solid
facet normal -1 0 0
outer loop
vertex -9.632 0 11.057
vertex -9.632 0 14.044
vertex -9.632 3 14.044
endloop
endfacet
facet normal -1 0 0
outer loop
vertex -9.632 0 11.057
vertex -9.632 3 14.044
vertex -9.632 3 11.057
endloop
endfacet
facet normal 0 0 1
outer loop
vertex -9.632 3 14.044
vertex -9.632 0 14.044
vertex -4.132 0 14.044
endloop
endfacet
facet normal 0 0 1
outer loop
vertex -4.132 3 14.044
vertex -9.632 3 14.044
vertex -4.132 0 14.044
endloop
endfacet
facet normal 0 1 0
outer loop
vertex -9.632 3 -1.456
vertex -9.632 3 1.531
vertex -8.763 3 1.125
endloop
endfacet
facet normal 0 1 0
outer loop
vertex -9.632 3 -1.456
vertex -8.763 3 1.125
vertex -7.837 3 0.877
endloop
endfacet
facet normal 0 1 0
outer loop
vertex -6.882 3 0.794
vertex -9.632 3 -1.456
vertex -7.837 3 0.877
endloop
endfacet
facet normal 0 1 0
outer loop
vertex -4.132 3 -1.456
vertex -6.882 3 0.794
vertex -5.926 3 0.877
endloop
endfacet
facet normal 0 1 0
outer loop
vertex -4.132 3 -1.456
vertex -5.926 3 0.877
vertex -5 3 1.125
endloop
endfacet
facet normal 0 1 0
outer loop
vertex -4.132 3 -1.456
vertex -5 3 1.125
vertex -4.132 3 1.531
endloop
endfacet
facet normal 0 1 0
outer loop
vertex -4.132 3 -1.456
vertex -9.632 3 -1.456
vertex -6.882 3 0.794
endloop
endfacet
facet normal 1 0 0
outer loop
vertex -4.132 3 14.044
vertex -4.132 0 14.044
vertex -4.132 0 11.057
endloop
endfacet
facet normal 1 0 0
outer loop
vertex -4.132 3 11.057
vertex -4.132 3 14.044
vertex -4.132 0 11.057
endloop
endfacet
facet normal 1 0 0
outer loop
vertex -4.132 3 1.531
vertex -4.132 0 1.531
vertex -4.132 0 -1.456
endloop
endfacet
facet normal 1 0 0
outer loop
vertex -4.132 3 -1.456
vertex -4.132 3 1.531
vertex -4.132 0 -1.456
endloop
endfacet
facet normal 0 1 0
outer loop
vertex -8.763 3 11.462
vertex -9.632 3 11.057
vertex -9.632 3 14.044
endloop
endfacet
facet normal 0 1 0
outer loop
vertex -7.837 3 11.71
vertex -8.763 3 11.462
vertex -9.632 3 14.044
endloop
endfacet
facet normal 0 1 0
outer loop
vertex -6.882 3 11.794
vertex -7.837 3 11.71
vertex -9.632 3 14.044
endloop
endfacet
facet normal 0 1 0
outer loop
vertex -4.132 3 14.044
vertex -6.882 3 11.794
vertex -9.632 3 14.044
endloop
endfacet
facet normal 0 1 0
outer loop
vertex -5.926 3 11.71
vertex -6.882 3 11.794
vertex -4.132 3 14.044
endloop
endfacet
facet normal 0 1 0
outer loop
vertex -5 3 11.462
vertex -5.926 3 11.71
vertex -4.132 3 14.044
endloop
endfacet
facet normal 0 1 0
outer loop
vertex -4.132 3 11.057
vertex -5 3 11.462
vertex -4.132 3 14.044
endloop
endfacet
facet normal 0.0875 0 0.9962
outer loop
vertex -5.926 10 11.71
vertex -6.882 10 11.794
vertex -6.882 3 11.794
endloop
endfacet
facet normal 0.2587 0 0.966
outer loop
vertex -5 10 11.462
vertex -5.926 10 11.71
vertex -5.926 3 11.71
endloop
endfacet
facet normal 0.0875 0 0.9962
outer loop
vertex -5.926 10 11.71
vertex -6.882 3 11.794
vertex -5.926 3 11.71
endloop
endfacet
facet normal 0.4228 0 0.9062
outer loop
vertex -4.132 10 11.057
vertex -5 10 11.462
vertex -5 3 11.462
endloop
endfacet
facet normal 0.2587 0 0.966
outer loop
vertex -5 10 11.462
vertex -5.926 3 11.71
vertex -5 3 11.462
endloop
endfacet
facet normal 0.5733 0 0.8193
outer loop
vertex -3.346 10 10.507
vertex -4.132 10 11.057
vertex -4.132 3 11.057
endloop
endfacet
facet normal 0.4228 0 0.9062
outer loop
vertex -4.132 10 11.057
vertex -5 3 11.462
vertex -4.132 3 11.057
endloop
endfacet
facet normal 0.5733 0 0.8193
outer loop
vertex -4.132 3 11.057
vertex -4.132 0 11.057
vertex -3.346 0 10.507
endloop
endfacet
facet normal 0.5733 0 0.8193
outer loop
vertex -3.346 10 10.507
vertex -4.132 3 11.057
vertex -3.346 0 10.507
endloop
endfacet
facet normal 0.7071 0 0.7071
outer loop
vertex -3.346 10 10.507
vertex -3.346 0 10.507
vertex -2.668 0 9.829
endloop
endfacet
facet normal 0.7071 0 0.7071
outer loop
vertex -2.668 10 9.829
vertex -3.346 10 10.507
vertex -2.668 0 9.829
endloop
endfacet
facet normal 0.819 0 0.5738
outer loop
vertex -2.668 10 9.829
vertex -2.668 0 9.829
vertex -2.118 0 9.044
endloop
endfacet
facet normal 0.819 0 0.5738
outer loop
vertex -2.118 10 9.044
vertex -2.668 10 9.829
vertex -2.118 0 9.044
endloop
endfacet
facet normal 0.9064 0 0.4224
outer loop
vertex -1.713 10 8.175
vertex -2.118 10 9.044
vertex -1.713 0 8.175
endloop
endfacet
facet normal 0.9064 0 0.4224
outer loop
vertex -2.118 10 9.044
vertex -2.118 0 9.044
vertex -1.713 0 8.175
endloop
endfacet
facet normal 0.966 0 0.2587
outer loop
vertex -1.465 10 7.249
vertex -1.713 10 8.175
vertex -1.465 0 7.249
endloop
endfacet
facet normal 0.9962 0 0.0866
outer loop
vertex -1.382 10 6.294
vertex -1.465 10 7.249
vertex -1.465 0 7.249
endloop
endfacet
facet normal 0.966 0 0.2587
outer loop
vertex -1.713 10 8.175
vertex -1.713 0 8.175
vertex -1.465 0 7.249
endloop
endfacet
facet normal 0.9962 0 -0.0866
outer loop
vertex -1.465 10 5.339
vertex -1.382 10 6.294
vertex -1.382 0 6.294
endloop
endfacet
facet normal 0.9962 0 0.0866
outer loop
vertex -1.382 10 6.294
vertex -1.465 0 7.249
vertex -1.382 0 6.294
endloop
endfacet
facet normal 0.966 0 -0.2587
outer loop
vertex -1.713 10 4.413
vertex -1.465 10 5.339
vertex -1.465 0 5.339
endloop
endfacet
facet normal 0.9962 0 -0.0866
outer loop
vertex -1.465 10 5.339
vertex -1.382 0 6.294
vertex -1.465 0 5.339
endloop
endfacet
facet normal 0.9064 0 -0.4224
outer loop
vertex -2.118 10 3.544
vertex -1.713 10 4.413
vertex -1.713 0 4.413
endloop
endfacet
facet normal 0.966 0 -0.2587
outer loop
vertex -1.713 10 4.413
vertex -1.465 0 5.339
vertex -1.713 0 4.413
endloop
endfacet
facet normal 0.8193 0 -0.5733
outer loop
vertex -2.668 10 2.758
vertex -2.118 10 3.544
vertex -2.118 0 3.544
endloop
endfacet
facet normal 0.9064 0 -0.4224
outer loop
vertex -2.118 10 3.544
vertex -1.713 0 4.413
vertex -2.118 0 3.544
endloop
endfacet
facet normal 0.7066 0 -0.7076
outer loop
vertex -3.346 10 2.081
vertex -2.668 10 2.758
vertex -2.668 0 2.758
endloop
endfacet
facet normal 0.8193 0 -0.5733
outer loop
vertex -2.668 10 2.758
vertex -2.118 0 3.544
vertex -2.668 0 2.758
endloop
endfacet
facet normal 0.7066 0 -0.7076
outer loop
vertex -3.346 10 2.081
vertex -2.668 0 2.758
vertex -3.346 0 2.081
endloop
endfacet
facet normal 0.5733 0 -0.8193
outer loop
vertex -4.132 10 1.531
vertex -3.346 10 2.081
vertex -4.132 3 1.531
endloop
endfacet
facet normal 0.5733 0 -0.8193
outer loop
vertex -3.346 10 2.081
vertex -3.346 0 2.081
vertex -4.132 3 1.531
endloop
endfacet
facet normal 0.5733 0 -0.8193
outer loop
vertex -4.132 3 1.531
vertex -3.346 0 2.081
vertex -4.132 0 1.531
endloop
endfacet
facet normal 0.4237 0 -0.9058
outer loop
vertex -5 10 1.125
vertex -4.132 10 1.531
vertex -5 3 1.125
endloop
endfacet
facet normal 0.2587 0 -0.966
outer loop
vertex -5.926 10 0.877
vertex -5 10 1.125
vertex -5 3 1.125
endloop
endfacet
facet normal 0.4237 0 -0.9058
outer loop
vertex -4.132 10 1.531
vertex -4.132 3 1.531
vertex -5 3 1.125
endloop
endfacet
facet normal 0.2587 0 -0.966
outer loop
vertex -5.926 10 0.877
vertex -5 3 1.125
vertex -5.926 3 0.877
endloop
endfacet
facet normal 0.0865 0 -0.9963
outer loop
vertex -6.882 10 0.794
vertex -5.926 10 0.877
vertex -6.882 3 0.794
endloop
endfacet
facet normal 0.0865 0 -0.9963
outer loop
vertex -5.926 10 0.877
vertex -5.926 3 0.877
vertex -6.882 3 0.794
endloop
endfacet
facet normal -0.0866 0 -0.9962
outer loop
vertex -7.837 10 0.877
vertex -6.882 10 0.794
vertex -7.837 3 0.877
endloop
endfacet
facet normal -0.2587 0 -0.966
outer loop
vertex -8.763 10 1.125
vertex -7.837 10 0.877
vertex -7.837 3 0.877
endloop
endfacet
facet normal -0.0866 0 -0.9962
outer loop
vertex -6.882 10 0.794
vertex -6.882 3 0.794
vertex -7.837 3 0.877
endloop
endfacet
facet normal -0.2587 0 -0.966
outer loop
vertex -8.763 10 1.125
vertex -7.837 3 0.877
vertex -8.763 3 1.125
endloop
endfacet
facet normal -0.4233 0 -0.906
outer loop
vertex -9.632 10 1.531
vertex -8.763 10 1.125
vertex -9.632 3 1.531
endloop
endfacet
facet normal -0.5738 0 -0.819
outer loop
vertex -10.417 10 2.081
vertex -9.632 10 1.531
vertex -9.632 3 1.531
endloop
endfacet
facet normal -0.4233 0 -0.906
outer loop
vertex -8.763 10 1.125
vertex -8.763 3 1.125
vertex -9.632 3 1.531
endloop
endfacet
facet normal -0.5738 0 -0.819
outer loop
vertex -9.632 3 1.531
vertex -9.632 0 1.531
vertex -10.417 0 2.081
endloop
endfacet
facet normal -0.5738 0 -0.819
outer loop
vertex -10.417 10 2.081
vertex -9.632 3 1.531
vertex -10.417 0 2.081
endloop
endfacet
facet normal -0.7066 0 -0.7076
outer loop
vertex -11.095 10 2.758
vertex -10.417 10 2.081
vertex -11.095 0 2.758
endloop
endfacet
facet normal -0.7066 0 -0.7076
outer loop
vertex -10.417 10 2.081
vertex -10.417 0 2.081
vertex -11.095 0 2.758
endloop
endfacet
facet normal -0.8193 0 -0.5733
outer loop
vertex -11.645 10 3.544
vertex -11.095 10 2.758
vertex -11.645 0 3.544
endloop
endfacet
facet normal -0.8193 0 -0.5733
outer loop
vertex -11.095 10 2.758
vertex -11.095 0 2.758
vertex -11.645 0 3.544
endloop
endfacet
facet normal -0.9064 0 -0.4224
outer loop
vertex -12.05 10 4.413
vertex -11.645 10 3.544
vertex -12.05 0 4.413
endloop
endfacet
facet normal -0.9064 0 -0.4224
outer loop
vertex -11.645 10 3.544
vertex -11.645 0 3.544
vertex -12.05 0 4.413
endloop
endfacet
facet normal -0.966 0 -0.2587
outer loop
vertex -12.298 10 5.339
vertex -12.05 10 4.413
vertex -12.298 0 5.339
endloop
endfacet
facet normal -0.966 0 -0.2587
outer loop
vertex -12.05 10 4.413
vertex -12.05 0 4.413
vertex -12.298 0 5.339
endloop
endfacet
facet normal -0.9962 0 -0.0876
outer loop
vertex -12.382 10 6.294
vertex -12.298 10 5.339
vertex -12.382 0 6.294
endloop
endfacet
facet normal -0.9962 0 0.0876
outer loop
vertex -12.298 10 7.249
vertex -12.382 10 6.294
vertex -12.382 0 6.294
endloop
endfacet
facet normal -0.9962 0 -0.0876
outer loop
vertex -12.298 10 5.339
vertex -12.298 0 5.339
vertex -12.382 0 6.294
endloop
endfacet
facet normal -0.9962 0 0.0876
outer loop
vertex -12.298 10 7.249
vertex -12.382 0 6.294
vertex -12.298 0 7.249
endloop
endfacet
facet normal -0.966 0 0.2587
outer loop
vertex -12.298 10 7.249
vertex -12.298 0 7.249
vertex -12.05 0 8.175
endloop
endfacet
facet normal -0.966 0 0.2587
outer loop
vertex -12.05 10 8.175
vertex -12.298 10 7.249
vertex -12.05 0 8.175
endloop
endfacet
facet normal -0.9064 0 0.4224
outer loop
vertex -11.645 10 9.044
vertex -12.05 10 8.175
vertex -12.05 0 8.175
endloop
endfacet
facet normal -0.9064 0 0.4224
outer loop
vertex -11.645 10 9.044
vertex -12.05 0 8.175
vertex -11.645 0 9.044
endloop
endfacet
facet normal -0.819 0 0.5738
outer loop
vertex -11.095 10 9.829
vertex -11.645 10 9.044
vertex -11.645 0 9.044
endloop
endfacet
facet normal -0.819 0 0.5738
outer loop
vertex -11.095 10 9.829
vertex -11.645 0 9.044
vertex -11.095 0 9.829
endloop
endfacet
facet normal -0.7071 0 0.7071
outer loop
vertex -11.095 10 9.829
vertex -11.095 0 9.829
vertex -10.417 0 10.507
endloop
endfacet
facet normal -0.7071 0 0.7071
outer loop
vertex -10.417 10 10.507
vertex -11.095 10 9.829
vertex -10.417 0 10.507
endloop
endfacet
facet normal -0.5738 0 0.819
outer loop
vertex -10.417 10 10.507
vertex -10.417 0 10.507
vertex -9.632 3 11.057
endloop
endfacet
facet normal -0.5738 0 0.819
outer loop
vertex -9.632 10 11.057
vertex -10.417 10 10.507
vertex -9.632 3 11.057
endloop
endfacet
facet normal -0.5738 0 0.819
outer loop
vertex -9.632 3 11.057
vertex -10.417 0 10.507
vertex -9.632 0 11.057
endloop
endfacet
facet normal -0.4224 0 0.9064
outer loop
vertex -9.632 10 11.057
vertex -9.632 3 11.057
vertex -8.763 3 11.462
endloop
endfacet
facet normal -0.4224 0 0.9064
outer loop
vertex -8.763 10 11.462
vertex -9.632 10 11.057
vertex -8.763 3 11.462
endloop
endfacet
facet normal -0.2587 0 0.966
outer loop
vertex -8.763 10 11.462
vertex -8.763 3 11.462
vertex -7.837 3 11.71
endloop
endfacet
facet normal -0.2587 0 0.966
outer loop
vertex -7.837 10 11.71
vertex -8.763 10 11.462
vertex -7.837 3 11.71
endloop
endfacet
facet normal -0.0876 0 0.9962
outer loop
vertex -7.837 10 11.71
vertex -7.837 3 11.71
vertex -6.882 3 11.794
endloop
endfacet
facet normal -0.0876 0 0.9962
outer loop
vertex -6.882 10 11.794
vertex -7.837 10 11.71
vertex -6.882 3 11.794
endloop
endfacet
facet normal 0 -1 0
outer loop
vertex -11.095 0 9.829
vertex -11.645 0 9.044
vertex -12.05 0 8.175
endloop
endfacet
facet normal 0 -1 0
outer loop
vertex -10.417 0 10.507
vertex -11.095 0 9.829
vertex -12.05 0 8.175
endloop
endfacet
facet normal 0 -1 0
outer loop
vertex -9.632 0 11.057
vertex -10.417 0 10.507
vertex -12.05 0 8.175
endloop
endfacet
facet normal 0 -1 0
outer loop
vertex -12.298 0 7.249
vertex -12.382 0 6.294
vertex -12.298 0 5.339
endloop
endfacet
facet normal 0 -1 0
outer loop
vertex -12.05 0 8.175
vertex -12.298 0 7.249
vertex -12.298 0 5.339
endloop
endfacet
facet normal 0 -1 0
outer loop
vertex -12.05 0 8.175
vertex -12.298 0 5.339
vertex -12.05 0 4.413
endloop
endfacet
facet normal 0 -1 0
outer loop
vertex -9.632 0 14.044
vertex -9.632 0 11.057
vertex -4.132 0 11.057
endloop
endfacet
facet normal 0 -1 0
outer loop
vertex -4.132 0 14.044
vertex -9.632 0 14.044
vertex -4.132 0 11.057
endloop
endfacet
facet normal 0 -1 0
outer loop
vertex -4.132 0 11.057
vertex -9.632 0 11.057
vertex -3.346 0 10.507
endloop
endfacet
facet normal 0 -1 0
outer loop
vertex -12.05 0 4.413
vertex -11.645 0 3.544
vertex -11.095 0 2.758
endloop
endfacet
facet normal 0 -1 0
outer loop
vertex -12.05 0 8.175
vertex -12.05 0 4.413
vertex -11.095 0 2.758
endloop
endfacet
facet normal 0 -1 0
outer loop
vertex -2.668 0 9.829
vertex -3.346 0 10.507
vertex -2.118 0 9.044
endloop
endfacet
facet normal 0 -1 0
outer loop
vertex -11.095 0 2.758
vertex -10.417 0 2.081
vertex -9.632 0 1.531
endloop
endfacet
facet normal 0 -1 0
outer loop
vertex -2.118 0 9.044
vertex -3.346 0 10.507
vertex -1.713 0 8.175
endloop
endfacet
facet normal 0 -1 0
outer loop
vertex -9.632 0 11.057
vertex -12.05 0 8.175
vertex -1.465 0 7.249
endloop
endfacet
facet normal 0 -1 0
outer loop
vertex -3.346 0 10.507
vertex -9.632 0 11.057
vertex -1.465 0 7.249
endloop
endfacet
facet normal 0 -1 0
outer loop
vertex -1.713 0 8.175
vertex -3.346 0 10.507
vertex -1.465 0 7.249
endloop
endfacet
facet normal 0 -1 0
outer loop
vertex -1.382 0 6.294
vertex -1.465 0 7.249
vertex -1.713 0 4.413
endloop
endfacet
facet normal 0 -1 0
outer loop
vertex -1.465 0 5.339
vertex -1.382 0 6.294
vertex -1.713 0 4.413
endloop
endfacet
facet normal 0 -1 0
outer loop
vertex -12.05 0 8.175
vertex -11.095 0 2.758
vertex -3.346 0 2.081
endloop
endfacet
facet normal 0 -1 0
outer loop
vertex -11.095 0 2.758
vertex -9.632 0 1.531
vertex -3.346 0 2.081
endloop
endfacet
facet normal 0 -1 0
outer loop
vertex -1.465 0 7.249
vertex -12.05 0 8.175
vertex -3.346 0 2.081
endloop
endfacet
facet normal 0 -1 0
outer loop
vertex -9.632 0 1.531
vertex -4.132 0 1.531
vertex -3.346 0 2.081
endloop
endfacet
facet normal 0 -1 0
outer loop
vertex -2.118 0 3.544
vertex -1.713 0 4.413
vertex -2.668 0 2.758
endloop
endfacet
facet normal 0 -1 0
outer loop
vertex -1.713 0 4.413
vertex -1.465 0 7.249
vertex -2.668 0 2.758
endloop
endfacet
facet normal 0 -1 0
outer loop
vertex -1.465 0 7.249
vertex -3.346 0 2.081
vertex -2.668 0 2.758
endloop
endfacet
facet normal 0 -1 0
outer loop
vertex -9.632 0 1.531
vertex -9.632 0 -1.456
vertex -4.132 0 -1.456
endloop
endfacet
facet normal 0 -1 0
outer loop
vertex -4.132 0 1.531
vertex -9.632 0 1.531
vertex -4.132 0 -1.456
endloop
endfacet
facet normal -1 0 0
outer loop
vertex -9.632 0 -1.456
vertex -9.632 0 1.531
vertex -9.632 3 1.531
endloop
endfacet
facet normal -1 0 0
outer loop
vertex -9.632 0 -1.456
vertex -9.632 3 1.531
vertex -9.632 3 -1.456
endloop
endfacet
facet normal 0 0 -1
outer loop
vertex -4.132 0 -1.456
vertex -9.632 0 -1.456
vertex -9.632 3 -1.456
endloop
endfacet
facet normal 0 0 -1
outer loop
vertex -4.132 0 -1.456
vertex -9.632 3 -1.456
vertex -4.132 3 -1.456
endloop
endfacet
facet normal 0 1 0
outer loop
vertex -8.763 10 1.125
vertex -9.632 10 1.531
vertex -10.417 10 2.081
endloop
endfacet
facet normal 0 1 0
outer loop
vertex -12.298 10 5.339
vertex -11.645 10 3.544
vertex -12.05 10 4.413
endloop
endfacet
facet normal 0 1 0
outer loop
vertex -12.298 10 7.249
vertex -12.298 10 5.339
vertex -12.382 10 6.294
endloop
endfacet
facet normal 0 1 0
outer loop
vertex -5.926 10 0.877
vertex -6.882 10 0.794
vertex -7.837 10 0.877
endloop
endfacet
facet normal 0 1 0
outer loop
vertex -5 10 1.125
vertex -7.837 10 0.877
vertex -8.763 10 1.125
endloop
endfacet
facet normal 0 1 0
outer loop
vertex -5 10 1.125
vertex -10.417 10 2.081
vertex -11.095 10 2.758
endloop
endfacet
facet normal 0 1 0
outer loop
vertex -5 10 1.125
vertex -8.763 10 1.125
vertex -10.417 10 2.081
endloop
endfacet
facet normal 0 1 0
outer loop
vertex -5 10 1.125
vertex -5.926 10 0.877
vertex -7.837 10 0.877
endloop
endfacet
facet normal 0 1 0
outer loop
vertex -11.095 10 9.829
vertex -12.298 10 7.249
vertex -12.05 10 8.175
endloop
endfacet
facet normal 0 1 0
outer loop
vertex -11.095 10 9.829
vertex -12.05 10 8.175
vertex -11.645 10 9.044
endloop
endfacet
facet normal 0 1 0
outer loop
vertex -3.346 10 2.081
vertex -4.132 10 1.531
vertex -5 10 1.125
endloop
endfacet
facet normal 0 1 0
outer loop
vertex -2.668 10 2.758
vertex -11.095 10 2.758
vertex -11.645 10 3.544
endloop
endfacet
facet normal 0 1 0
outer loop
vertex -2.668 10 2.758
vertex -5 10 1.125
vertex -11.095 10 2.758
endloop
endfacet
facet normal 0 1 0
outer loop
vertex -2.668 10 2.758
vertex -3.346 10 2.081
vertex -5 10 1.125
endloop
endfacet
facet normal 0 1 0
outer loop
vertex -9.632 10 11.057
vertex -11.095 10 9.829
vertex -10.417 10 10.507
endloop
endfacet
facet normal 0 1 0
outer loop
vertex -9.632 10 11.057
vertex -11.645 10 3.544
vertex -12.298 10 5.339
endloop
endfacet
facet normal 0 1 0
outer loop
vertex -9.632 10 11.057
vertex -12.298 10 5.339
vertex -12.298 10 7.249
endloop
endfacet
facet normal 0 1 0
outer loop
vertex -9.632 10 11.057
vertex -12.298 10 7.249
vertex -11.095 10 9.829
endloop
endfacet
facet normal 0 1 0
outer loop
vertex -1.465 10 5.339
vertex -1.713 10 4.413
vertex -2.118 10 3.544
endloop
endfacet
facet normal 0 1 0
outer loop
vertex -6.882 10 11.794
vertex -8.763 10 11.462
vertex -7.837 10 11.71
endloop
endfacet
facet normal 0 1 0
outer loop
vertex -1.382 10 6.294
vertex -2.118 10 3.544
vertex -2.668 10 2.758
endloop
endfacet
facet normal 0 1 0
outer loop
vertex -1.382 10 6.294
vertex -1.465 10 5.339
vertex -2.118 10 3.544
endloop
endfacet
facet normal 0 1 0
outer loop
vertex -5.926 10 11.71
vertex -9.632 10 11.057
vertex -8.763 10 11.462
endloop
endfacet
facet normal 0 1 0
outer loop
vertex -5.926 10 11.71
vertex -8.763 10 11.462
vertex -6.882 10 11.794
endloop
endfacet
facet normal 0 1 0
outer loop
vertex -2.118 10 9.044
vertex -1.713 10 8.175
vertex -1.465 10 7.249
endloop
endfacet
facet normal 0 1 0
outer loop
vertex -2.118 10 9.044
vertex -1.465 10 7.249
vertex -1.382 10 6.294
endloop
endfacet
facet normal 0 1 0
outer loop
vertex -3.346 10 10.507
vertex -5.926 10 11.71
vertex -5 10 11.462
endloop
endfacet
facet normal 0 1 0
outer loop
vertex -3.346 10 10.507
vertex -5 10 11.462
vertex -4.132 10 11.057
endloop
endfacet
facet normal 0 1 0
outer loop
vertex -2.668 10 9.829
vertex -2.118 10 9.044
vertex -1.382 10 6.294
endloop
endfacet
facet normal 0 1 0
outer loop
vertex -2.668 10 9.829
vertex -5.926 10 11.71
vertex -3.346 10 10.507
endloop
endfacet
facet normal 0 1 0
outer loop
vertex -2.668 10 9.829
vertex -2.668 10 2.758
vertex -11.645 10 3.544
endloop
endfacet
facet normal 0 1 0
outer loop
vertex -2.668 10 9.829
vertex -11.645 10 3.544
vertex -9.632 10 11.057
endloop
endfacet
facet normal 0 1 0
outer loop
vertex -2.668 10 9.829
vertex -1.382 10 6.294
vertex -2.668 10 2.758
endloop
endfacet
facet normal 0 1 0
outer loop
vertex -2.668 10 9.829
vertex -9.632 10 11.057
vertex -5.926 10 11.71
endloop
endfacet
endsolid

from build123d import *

# Parameters (mm, degrees)
CROQUIS1_R              = 5.5
SALIENTE_EXTRUIR1_DEPTH = 10
CROQUIS3_W              = 5.5
CROQUIS3_H              = 15.5
SALIENTE_EXTRUIR2_DEPTH = 3


with BuildPart() as part:
    # Croquis1 → Saliente-Extruir1 (new body)
    with BuildSketch(Plane(origin=(0, 0, 0), x_dir=(1, 0, 0), z_dir=(0, 1, 0))):
        with Locations(Location((-6.881511077, -6.29378807, 0), (0, 0, 270))):
            Circle(CROQUIS1_R)
    extrude(amount=SALIENTE_EXTRUIR1_DEPTH)

    # Croquis3 → Saliente-Extruir2 (add)
    with BuildSketch(Plane(origin=(0, 0, 0), x_dir=(1, 0, 0), z_dir=(0, 1, 0))):
        with Locations((-6.881511077, -6.29378807)):
            Rectangle(CROQUIS3_W, CROQUIS3_H)
    extrude(amount=SALIENTE_EXTRUIR2_DEPTH)


solid = part.part
